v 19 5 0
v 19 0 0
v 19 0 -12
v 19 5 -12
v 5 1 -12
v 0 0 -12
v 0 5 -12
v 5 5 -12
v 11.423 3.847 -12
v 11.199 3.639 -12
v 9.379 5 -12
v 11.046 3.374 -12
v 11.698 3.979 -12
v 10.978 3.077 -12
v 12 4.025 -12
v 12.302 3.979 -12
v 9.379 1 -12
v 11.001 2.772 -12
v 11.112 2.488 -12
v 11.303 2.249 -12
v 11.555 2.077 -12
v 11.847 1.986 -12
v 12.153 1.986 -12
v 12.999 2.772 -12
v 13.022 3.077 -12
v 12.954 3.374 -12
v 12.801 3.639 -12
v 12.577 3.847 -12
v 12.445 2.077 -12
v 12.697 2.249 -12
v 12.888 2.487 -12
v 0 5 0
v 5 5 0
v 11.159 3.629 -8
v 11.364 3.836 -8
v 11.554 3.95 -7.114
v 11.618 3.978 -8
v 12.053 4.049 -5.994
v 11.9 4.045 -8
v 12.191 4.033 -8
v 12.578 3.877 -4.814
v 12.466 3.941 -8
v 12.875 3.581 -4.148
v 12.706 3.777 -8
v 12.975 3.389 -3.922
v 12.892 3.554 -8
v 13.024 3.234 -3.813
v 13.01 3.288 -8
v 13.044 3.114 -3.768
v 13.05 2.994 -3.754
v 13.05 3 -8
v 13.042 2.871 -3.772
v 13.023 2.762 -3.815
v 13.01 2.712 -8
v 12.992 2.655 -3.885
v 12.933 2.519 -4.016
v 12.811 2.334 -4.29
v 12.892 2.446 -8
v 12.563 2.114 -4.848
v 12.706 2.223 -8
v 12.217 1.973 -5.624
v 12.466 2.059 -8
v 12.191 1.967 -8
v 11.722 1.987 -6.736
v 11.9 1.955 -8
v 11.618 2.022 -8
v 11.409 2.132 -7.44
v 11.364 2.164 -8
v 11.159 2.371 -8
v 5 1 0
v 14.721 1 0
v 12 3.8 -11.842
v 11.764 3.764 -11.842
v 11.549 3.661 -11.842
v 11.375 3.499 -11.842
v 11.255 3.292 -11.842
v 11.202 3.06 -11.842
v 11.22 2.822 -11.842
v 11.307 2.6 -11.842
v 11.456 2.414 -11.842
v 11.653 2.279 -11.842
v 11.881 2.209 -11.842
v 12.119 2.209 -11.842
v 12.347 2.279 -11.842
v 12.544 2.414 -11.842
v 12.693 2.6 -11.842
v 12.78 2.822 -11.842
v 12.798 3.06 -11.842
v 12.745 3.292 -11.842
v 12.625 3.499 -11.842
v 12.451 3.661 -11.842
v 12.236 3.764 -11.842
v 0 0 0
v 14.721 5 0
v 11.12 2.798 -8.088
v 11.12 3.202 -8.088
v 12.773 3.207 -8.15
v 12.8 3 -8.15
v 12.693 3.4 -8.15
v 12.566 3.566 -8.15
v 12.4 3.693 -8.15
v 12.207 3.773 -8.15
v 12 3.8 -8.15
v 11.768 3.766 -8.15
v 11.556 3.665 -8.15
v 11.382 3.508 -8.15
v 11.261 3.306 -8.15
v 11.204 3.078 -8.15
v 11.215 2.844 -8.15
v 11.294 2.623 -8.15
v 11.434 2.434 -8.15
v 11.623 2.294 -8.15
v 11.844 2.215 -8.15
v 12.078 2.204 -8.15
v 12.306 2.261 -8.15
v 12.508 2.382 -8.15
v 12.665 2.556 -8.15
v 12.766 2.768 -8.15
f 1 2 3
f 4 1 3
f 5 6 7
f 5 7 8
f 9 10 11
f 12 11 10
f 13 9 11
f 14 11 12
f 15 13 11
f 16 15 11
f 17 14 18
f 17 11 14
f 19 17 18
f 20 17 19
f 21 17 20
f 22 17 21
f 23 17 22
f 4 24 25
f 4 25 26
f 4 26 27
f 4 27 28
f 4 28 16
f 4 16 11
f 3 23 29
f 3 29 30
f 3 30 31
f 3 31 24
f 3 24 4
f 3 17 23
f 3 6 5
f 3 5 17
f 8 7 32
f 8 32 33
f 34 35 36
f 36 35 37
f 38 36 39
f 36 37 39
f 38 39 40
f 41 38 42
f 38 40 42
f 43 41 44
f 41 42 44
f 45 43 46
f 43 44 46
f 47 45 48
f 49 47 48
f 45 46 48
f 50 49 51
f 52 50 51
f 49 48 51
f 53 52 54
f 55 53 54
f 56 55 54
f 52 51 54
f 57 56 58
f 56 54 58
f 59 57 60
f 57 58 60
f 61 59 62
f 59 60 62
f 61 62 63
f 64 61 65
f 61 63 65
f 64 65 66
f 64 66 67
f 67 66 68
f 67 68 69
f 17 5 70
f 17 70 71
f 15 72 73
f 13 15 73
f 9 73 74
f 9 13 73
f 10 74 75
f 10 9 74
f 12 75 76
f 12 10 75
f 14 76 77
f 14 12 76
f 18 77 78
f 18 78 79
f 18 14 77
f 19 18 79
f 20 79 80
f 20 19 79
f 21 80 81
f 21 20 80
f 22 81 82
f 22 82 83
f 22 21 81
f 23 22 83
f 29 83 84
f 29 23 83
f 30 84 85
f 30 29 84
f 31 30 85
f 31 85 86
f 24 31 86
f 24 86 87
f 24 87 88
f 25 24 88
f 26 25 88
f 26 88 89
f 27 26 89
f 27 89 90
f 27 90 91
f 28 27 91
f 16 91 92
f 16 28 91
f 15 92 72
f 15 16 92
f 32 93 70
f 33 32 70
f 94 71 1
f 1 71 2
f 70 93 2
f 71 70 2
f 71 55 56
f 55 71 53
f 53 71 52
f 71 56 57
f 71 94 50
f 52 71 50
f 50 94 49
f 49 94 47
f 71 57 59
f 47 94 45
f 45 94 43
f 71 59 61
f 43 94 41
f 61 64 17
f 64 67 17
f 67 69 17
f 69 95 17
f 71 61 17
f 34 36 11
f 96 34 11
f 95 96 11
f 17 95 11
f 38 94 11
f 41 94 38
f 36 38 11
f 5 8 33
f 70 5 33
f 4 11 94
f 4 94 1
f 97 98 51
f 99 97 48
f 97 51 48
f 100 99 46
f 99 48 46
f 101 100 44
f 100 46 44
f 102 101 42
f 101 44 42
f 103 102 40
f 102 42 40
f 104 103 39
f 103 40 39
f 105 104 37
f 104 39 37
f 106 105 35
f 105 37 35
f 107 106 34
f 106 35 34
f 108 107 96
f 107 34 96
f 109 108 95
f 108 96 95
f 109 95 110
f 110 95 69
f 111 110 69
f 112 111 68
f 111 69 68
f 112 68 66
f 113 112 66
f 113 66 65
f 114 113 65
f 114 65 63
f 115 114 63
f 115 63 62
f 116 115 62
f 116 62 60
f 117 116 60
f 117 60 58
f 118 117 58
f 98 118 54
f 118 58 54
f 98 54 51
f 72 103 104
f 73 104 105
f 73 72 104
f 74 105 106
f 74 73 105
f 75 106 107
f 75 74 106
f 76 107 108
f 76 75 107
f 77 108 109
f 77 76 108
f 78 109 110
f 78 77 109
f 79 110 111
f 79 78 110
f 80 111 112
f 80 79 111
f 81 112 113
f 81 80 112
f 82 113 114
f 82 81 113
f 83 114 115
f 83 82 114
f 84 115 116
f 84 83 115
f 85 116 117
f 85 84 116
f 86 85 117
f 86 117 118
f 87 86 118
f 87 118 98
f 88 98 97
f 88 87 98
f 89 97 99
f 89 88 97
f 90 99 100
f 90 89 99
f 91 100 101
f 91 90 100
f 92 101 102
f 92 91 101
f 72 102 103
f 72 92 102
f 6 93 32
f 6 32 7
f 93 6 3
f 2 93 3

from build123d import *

# Parameters (mm, degrees)
SKETCH_3_W            = 19
SKETCH_3_H            = 12
EXTRUDE_1_DEPTH       = 5
HOLE_WIZARD_M23_D     = 2.1
HOLE_WIZARD_M23_DEPTH = 8
HOLE_WIZARD_M23_TIP   = 0.63090365
CUT_EXTRUDE_1_DEPTH   = 4


with BuildPart() as part:
    # Эскиз3 → Бобышка-Вытянуть1 (new body)
    with BuildSketch(Plane(origin=(0, 0, 0), x_dir=(1, 0, 0), z_dir=(0, 1, 0))):
        with Locations((9.5, 6)):
            Rectangle(SKETCH_3_W, SKETCH_3_H)
    extrude(amount=EXTRUDE_1_DEPTH)

    # Эскиз8 → Отверстие обработанное метчиком M2x0.42 (revolve, cut)
    with BuildSketch(Plane(origin=(12, 3, -12), x_dir=(0, 1, 0), z_dir=(1, 0, 0))):
        Polygon((0, 0), (0, 12), (1.025, 12), (0.8, 11.842453304), (0.8, 0.157546696), (1.025, 0), align=None)
    revolve(axis=Axis((12, 3, -18.35), (0, 0, 1)), mode=Mode.SUBTRACT)

    # Отверстие с зазором M23
    with Locations(Plane.XY):
        with Locations((12, 3)):
            Hole(HOLE_WIZARD_M23_D / 2, depth=HOLE_WIZARD_M23_DEPTH)
            with Locations((0, 0, -(HOLE_WIZARD_M23_DEPTH + HOLE_WIZARD_M23_TIP / 2))):  # 118° drill point
                Cone(0, HOLE_WIZARD_M23_D / 2, HOLE_WIZARD_M23_TIP, mode=Mode.SUBTRACT)

    # Эскиз4 → Вырез-Вытянуть1 (cut)
    with BuildSketch(Plane(origin=(0, 5, 0), x_dir=(1, 0, 0), z_dir=(0, 1, 0))):
        Polygon((5, 12), (5, 0), (14.721289338, 0), (9.378545114, 12), align=None)
    extrude(amount=-CUT_EXTRUDE_1_DEPTH, mode=Mode.SUBTRACT)


solid = part.part
